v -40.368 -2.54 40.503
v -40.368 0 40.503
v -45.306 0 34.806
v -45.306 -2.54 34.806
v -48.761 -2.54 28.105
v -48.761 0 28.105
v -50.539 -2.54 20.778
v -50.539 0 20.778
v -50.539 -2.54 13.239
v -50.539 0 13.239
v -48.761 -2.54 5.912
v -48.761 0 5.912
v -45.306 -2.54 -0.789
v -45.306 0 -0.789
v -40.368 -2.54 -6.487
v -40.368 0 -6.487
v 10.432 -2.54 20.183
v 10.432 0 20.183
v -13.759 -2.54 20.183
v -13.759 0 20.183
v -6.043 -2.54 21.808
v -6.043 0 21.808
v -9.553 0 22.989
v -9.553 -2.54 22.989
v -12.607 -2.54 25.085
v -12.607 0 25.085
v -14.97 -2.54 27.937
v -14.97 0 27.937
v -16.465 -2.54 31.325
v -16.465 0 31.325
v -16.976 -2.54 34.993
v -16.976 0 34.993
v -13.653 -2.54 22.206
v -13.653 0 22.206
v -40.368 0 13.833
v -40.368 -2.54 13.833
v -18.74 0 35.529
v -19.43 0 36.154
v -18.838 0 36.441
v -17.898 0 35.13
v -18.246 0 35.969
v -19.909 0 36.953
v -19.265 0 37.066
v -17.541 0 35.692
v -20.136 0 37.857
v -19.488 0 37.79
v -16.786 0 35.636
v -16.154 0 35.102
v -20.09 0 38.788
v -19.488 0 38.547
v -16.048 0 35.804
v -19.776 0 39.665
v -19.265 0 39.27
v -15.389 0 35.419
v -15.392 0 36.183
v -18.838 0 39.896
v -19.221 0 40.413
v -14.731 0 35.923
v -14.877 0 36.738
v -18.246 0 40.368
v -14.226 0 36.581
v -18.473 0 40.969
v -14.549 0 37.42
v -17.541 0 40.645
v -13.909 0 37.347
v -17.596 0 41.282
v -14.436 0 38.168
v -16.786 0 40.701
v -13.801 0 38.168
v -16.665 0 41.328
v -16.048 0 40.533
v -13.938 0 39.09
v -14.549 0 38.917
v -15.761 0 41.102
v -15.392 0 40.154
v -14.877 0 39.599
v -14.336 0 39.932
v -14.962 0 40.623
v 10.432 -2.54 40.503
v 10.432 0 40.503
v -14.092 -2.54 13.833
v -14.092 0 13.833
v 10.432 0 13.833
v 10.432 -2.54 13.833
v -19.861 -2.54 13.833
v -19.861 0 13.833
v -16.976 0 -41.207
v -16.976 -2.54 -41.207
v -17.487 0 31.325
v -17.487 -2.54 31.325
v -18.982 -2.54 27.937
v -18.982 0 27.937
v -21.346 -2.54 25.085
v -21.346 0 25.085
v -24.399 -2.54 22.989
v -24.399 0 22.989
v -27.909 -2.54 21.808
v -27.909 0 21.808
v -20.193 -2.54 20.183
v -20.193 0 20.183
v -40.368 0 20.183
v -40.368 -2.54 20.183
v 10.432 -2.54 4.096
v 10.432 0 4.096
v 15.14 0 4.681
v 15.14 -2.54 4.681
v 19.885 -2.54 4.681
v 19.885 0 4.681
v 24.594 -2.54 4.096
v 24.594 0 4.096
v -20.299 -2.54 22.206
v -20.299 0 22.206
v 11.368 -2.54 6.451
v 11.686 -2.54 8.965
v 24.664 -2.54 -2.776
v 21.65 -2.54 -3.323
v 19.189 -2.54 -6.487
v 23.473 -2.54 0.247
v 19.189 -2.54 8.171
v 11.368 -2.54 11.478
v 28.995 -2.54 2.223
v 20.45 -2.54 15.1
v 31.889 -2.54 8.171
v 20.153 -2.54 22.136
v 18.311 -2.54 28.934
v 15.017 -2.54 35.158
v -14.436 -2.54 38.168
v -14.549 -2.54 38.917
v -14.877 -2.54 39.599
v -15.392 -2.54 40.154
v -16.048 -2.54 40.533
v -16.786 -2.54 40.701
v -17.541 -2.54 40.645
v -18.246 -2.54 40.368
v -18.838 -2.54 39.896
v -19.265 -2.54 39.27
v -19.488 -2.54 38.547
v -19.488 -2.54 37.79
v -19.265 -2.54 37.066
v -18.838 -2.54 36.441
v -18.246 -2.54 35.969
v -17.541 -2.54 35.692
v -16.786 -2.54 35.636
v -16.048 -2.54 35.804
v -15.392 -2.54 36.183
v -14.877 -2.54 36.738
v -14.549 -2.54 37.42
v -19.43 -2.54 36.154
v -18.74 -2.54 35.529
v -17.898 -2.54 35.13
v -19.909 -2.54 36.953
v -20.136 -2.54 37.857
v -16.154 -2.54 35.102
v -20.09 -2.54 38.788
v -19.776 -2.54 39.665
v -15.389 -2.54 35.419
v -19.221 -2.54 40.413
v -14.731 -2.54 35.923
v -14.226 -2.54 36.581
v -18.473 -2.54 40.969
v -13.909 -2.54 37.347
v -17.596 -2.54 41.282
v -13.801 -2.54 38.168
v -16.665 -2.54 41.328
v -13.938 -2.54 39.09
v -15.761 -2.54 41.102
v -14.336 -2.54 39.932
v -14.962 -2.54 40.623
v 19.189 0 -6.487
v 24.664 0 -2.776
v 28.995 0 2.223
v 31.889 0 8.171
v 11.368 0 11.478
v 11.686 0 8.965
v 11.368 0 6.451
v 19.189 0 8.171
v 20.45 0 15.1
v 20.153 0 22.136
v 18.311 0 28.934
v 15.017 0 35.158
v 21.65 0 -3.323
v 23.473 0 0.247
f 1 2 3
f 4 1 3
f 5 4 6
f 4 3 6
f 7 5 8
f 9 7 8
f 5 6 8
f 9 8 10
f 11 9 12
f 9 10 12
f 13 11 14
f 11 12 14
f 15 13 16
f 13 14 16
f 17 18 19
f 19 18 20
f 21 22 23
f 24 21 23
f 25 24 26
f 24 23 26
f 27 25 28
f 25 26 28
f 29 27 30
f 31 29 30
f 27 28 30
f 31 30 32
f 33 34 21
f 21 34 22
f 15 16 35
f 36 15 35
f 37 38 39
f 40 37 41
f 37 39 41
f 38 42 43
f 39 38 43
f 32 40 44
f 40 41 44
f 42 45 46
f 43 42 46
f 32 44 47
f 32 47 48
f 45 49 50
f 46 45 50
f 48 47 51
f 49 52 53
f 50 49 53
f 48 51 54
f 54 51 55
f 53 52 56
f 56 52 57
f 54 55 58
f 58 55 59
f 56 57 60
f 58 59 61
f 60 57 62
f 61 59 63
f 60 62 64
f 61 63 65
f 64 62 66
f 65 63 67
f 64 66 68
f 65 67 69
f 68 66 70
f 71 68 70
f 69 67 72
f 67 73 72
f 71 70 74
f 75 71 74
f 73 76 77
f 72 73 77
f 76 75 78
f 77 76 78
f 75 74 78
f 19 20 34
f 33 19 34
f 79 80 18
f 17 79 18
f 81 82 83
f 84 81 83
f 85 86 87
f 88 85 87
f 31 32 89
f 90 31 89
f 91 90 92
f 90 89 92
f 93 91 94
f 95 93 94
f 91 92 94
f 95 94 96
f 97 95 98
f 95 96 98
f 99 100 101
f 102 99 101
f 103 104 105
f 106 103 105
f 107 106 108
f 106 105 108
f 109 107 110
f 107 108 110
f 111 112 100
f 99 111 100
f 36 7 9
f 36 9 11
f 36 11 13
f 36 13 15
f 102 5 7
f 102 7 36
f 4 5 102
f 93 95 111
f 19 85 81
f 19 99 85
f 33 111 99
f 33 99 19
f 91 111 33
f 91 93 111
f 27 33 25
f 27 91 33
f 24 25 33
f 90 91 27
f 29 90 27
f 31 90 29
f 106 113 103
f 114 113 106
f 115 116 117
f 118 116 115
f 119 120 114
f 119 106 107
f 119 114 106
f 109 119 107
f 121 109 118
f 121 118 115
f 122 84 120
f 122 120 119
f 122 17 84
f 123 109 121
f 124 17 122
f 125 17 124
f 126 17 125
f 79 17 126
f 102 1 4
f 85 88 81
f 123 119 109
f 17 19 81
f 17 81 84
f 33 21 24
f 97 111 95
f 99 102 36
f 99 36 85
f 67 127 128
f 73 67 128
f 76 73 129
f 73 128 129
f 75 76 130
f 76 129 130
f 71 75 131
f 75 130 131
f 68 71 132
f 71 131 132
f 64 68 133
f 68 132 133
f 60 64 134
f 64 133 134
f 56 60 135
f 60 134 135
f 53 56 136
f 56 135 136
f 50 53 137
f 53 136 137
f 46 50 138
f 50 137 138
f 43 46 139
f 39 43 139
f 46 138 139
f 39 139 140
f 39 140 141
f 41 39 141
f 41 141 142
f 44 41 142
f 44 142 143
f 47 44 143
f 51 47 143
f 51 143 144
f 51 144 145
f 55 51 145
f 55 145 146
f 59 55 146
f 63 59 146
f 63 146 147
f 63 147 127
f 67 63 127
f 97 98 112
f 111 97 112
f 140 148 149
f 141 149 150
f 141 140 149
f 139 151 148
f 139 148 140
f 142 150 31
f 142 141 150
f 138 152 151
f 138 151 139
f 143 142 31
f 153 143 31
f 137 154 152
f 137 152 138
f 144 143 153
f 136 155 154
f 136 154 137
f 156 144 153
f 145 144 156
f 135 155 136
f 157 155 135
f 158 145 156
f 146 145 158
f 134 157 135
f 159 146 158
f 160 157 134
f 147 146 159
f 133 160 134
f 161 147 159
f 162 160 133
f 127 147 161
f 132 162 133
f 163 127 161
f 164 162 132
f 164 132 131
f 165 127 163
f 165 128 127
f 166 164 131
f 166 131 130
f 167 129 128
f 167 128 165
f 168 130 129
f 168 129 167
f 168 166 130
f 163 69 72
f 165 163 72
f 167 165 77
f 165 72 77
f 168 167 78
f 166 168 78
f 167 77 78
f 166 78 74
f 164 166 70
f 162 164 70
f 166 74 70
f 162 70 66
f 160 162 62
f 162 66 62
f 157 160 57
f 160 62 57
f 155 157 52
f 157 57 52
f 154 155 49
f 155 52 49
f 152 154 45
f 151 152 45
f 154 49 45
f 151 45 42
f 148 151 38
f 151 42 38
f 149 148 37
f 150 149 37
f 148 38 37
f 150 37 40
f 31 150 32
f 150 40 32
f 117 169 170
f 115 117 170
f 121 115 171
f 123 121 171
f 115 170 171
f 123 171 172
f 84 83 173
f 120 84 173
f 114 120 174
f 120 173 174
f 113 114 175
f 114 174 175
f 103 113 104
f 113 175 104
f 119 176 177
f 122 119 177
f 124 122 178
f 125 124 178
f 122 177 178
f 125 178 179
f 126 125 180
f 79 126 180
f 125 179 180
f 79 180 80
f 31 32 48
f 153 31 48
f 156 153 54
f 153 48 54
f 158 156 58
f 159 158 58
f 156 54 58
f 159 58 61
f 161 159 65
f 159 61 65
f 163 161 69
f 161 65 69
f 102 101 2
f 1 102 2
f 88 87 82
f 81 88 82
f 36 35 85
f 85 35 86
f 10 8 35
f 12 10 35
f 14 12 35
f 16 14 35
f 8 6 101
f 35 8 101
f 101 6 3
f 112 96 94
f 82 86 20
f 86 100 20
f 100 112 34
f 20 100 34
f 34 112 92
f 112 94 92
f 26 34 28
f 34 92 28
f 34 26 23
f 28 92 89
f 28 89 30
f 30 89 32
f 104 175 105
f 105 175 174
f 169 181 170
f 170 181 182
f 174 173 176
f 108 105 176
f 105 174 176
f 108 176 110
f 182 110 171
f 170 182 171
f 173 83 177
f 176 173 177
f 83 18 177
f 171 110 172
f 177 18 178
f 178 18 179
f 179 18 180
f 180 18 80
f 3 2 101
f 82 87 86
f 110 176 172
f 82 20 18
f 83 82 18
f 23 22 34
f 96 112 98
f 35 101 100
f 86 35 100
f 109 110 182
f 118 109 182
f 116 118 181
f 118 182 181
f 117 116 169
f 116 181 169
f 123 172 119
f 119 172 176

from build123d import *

# Parameters (mm, degrees)
F1_DEPTH = 2.54
F2_R     = 2.54
F3_DEPTH = 25.4


with BuildPart() as f1:
    # F0 (on Front) → F1 (new body)
    with BuildSketch(Plane.XZ):
        with BuildLine():
            Line((-19.8606117019, 13.833210381), (-20.1934011004, 20.183210381))
            Line((-20.1934011004, 20.183210381), (-40.3683818877, 20.183210381))
            Line((-40.3683818877, 20.183210381), (-40.3683818877, 40.503210381))
            ThreePointArc((-40.3683818877, 40.503210381), (-50.7631138023, 17.008210381), (-40.3683818877, -6.486789619))
            Line((-40.3683818877, -6.486789619), (-40.3683818877, 13.833210381))
            Line((-40.3683818877, 13.833210381), (-19.8606117019, 13.833210381))
        make_face()
        Polygon((-16.9760986947, 13.833210381), (-16.9760986947, 20.183210381), (-20.1934011004, 20.183210381), (-19.8606117019, 13.833210381), align=None)
        Polygon((-13.758796289, 20.183210381), (-16.9760986947, 20.183210381), (-16.9760986947, 13.833210381), (-14.0915856875, 13.833210381), align=None)
        with BuildLine():
            ThreePointArc((-6.0432084185, 21.8075988829), (-13.8873741341, 26.4290486788), (-16.9760986947, 34.9934234125))
            Line((-16.9760986947, 34.9934234125), (-16.9760986947, 20.183210381))
            Line((-16.9760986947, 20.183210381), (-13.758796289, 20.183210381))
            Line((-13.758796289, 20.183210381), (-13.6527654733, 22.2063988695))
            Line((-13.6527654733, 22.2063988695), (-6.0432084185, 21.8075988829))
        make_face()
        with BuildLine():
            Line((-16.9760986947, 20.183210381), (-16.9760986947, 34.9934234125))
            ThreePointArc((-16.9760986947, 34.9934234125), (-20.0648232553, 26.4290486788), (-27.908988971, 21.8075988829))
            Line((-27.908988971, 21.8075988829), (-20.2994319161, 22.2063988695))
            Line((-20.2994319161, 22.2063988695), (-20.1934011004, 20.183210381))
            Line((-20.1934011004, 20.183210381), (-16.9760986947, 20.183210381))
        make_face()
        Polygon((-16.9760986947, -41.2065765875), (-16.9760986947, 13.833210381), (-19.8606117019, 13.833210381), align=None)
        Polygon((-14.0915856875, 13.833210381), (-16.9760986947, 13.833210381), (-16.9760986947, -41.2065765875), align=None)
        with BuildLine():
            Line((10.4316181123, 20.183210381), (-13.758796289, 20.183210381))
            Line((-13.758796289, 20.183210381), (-14.0915856875, 13.833210381))
            Line((-14.0915856875, 13.833210381), (10.4316181123, 13.833210381))
            ThreePointArc((10.4316181123, 13.833210381), (11.6864430061, 8.9645224678), (10.4316181123, 4.0958345546))
            ThreePointArc((10.4316181123, 4.0958345546), (17.5128935273, 4.7538780033), (24.5941689423, 4.0958345546))
            ThreePointArc((24.5941689423, 4.0958345546), (22.6460179988, -1.5808020351), (19.1890278488, -6.486789619))
            ThreePointArc((19.1890278488, -6.486789619), (26.993139569, -0.4176619891), (31.8890278488, 8.1712115041))
            Line((31.8890278488, 8.1712115041), (19.1890278488, 8.1712115041))
            ThreePointArc((19.1890278488, 8.1712115041), (19.4210511996, 25.5860677284), (10.4316181123, 40.503210381))
            Line((10.4316181123, 40.503210381), (10.4316181123, 20.183210381))
        make_face()
    extrude(amount=F1_DEPTH)


with BuildPart() as f1b:
    # F0 (on Front) → F1, piece 2 (new body)
    with BuildSketch(Plane.XZ):
        with BuildLine():
            ThreePointArc((-13.8010986947, 38.1684234125), (-19.221162725, 40.4134874428), (-16.9760986947, 34.9934234125))
            ThreePointArc((-16.9760986947, 34.9934234125), (-14.7310346644, 35.9233593823), (-13.8010986947, 38.1684234125))
        make_face()
    extrude(amount=F1_DEPTH)

    # F2 (on face) → F3 (cut)
    with BuildSketch(Plane.XZ.offset(2.54)):
        with Locations((-16.9760986947, 38.1684234125)):
            Circle(F2_R)
    extrude(amount=-F3_DEPTH, mode=Mode.SUBTRACT)


solid = Compound([f1.part, f1b.part])
